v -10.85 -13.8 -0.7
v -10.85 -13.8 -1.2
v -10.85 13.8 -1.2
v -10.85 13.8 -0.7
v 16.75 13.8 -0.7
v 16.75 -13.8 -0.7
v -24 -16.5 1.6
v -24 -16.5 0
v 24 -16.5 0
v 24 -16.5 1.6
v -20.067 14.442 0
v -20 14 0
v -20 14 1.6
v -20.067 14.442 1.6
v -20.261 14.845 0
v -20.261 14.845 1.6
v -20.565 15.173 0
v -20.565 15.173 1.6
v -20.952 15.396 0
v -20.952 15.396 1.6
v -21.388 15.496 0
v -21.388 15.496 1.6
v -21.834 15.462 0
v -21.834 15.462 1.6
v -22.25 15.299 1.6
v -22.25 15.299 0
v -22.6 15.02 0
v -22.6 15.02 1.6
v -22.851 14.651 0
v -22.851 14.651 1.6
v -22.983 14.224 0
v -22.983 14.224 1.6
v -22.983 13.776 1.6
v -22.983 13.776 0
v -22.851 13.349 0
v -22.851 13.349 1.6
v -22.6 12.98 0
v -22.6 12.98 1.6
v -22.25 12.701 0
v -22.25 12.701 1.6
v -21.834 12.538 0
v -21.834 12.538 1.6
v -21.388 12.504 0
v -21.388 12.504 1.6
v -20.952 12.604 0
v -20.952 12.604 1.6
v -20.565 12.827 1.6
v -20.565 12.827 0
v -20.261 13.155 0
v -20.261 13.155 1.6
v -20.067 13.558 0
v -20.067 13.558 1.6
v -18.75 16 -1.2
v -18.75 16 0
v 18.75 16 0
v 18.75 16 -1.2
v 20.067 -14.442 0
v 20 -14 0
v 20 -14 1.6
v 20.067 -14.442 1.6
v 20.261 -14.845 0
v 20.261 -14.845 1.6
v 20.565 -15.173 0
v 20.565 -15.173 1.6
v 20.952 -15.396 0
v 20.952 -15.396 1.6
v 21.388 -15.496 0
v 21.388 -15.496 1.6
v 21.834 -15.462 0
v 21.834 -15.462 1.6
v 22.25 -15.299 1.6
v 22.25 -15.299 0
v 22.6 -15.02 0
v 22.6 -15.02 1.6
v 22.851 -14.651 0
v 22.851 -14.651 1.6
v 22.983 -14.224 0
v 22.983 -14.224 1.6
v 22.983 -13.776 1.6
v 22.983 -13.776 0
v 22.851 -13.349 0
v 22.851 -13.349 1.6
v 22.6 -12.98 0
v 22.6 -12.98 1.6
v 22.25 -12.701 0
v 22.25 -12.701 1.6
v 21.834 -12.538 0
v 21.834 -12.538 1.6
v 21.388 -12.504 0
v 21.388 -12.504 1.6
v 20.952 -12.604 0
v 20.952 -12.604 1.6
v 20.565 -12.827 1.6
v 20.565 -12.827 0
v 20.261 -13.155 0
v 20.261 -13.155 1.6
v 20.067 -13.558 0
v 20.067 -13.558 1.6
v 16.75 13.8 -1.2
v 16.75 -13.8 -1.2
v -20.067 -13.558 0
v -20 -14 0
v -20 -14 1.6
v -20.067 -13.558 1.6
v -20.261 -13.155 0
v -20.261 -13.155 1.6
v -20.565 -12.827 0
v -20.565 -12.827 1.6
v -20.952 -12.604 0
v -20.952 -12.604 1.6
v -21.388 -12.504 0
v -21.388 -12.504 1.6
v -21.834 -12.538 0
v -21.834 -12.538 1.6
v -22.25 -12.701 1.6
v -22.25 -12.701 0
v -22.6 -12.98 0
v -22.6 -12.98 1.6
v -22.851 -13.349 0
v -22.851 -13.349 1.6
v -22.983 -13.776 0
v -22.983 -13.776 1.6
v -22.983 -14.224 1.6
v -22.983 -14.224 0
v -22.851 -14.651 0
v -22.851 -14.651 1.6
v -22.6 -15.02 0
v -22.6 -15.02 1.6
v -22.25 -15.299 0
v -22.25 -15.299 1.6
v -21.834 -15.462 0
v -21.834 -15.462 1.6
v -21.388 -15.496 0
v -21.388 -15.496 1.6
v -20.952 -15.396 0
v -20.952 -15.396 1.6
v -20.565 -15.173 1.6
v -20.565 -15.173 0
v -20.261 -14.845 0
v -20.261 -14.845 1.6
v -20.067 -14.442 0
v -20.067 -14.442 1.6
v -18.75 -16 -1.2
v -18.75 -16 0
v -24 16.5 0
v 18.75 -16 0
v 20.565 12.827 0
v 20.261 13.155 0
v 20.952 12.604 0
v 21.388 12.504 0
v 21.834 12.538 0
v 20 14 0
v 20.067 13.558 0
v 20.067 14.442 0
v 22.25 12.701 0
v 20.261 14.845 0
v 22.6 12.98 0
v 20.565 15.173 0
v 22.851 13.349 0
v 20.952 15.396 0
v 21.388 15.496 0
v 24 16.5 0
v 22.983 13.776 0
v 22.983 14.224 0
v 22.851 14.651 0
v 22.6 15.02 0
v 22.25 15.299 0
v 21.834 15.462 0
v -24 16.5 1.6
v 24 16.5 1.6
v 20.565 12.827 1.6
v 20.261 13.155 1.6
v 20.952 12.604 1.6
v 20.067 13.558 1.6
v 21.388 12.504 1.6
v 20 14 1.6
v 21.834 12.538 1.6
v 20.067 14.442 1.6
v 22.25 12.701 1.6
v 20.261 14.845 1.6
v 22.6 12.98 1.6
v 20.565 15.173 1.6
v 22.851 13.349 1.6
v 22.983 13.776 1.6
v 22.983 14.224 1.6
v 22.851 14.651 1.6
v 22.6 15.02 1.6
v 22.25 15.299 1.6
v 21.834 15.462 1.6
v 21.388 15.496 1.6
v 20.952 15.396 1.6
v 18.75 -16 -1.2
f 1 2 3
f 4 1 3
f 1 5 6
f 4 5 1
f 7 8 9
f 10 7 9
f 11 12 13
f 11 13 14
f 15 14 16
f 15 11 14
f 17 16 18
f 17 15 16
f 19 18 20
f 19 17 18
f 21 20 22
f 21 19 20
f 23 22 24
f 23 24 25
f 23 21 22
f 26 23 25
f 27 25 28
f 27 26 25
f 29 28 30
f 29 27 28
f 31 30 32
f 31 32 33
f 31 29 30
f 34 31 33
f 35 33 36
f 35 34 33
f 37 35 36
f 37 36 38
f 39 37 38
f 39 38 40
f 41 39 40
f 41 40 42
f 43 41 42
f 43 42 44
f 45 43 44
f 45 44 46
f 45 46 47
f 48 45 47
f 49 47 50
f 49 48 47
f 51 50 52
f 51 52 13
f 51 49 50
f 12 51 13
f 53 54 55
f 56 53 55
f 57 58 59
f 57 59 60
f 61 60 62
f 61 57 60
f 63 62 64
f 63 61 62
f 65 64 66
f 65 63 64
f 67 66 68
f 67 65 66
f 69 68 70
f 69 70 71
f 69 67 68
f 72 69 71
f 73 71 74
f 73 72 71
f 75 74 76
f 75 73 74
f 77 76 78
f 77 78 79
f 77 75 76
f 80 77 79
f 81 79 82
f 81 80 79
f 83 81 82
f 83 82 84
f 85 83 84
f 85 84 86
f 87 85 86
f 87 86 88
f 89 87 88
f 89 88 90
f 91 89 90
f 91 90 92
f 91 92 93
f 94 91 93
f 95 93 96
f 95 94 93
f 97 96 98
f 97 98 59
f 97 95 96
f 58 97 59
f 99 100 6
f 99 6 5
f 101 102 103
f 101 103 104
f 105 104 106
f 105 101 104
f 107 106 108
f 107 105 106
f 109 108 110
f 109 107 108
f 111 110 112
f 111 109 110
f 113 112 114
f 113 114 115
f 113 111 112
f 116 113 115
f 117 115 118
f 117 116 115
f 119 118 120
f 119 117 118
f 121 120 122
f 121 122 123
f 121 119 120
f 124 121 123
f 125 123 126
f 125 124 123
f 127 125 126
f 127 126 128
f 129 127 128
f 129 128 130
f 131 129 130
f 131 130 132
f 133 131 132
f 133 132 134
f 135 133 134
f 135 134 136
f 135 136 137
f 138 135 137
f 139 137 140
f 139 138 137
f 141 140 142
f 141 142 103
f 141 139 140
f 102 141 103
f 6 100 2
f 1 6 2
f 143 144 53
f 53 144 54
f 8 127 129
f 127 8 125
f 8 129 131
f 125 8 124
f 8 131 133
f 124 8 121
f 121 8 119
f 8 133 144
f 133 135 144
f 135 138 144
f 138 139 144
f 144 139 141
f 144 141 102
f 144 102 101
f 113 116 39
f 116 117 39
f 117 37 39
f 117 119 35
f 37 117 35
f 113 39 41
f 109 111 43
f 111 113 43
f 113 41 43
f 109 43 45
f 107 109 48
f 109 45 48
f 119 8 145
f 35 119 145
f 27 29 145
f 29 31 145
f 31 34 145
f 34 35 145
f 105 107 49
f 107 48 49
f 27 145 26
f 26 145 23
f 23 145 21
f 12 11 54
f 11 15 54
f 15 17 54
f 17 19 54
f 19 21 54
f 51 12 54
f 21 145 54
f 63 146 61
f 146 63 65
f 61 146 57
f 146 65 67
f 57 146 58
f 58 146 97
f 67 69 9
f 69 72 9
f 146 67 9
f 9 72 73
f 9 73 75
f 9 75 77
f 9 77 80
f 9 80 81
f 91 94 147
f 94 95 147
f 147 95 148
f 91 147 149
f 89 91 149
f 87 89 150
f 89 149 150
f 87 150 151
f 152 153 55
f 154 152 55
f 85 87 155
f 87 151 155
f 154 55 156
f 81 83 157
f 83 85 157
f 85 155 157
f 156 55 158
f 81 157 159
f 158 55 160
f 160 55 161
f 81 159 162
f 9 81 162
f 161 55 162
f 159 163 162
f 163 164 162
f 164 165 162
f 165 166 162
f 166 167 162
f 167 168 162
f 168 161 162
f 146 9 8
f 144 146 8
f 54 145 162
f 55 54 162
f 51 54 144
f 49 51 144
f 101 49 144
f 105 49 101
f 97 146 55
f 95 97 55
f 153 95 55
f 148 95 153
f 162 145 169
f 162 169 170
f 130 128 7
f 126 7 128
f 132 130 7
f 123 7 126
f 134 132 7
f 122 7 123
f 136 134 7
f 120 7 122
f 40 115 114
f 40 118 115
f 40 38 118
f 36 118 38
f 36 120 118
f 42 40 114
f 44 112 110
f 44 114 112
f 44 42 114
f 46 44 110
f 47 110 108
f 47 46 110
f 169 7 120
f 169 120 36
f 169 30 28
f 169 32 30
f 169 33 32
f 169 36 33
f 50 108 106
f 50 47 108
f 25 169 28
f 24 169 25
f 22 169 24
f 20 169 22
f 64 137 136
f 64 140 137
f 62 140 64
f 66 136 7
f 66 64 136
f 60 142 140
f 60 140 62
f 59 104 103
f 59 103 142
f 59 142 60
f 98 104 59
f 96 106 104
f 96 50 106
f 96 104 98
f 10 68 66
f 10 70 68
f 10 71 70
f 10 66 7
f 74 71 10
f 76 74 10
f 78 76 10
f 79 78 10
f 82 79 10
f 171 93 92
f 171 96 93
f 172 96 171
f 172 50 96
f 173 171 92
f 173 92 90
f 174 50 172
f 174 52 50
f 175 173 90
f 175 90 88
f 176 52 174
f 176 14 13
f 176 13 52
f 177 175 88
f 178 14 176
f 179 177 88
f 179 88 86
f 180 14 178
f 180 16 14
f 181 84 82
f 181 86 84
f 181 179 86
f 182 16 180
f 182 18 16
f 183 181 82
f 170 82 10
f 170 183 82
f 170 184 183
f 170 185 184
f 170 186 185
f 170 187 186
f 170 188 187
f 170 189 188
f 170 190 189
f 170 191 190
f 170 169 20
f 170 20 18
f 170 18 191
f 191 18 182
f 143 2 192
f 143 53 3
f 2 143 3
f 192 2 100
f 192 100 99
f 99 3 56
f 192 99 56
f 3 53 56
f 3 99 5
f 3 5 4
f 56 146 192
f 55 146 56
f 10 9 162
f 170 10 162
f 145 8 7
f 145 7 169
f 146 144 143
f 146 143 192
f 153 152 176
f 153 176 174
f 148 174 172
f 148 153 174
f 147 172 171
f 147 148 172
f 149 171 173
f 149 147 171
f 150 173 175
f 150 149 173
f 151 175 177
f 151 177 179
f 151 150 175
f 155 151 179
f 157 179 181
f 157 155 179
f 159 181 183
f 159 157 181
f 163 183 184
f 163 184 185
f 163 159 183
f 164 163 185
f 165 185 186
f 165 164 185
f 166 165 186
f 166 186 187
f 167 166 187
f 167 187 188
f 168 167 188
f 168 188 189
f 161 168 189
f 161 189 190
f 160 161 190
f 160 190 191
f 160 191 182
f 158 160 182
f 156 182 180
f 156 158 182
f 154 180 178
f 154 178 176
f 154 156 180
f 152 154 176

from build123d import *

# Parameters (mm, degrees)
BASE_PCB_W              = 48
BASE_PCB_H              = 33
BASE_PCB_R              = 1.5
BOSS_EXTRU_1_DEPTH      = 1.6
ESQUISSE4_W             = 37.5
ESQUISSE4_H             = 32
BOSS_EXTRU_2_DEPTH      = 1.2
ESQUISSE5_W             = 27.6
ESQUISSE5_H             = 27.6
ENL_V_MAT_EXTRU_2_DEPTH = 0.5


with BuildPart() as part:
    # BASE PCB → Boss.-Extru.1 (new body)
    with BuildSketch(Plane.XY):
        Rectangle(BASE_PCB_W, BASE_PCB_H)
        with Locations((-21.5, 14)):
            Circle(BASE_PCB_R, mode=Mode.SUBTRACT)
        with Locations((-21.5, -14)):
            Circle(BASE_PCB_R, mode=Mode.SUBTRACT)
        with Locations(Location((21.5, -14, 0), (0, 0, 180))):
            Circle(BASE_PCB_R, mode=Mode.SUBTRACT)
        with Locations(Location((21.5, 14, 0), (0, 0, 180))):
            Circle(BASE_PCB_R, mode=Mode.SUBTRACT)
    extrude(amount=BOSS_EXTRU_1_DEPTH)

    # Esquisse4 → Boss.-Extru.2 (add)
    with BuildSketch(Plane.XY):
        Rectangle(ESQUISSE4_W, ESQUISSE4_H)
    extrude(amount=-BOSS_EXTRU_2_DEPTH)

    # Esquisse5 → Enlèv. mat.-Extru.2 (cut)
    with BuildSketch(Plane(origin=(0, 0, -1.2), x_dir=(-1, 0, 0), z_dir=(0, 0, -1))):
        with Locations((-2.95, 0)):
            Rectangle(ESQUISSE5_W, ESQUISSE5_H)
    extrude(amount=-ENL_V_MAT_EXTRU_2_DEPTH, mode=Mode.SUBTRACT)


solid = part.part
